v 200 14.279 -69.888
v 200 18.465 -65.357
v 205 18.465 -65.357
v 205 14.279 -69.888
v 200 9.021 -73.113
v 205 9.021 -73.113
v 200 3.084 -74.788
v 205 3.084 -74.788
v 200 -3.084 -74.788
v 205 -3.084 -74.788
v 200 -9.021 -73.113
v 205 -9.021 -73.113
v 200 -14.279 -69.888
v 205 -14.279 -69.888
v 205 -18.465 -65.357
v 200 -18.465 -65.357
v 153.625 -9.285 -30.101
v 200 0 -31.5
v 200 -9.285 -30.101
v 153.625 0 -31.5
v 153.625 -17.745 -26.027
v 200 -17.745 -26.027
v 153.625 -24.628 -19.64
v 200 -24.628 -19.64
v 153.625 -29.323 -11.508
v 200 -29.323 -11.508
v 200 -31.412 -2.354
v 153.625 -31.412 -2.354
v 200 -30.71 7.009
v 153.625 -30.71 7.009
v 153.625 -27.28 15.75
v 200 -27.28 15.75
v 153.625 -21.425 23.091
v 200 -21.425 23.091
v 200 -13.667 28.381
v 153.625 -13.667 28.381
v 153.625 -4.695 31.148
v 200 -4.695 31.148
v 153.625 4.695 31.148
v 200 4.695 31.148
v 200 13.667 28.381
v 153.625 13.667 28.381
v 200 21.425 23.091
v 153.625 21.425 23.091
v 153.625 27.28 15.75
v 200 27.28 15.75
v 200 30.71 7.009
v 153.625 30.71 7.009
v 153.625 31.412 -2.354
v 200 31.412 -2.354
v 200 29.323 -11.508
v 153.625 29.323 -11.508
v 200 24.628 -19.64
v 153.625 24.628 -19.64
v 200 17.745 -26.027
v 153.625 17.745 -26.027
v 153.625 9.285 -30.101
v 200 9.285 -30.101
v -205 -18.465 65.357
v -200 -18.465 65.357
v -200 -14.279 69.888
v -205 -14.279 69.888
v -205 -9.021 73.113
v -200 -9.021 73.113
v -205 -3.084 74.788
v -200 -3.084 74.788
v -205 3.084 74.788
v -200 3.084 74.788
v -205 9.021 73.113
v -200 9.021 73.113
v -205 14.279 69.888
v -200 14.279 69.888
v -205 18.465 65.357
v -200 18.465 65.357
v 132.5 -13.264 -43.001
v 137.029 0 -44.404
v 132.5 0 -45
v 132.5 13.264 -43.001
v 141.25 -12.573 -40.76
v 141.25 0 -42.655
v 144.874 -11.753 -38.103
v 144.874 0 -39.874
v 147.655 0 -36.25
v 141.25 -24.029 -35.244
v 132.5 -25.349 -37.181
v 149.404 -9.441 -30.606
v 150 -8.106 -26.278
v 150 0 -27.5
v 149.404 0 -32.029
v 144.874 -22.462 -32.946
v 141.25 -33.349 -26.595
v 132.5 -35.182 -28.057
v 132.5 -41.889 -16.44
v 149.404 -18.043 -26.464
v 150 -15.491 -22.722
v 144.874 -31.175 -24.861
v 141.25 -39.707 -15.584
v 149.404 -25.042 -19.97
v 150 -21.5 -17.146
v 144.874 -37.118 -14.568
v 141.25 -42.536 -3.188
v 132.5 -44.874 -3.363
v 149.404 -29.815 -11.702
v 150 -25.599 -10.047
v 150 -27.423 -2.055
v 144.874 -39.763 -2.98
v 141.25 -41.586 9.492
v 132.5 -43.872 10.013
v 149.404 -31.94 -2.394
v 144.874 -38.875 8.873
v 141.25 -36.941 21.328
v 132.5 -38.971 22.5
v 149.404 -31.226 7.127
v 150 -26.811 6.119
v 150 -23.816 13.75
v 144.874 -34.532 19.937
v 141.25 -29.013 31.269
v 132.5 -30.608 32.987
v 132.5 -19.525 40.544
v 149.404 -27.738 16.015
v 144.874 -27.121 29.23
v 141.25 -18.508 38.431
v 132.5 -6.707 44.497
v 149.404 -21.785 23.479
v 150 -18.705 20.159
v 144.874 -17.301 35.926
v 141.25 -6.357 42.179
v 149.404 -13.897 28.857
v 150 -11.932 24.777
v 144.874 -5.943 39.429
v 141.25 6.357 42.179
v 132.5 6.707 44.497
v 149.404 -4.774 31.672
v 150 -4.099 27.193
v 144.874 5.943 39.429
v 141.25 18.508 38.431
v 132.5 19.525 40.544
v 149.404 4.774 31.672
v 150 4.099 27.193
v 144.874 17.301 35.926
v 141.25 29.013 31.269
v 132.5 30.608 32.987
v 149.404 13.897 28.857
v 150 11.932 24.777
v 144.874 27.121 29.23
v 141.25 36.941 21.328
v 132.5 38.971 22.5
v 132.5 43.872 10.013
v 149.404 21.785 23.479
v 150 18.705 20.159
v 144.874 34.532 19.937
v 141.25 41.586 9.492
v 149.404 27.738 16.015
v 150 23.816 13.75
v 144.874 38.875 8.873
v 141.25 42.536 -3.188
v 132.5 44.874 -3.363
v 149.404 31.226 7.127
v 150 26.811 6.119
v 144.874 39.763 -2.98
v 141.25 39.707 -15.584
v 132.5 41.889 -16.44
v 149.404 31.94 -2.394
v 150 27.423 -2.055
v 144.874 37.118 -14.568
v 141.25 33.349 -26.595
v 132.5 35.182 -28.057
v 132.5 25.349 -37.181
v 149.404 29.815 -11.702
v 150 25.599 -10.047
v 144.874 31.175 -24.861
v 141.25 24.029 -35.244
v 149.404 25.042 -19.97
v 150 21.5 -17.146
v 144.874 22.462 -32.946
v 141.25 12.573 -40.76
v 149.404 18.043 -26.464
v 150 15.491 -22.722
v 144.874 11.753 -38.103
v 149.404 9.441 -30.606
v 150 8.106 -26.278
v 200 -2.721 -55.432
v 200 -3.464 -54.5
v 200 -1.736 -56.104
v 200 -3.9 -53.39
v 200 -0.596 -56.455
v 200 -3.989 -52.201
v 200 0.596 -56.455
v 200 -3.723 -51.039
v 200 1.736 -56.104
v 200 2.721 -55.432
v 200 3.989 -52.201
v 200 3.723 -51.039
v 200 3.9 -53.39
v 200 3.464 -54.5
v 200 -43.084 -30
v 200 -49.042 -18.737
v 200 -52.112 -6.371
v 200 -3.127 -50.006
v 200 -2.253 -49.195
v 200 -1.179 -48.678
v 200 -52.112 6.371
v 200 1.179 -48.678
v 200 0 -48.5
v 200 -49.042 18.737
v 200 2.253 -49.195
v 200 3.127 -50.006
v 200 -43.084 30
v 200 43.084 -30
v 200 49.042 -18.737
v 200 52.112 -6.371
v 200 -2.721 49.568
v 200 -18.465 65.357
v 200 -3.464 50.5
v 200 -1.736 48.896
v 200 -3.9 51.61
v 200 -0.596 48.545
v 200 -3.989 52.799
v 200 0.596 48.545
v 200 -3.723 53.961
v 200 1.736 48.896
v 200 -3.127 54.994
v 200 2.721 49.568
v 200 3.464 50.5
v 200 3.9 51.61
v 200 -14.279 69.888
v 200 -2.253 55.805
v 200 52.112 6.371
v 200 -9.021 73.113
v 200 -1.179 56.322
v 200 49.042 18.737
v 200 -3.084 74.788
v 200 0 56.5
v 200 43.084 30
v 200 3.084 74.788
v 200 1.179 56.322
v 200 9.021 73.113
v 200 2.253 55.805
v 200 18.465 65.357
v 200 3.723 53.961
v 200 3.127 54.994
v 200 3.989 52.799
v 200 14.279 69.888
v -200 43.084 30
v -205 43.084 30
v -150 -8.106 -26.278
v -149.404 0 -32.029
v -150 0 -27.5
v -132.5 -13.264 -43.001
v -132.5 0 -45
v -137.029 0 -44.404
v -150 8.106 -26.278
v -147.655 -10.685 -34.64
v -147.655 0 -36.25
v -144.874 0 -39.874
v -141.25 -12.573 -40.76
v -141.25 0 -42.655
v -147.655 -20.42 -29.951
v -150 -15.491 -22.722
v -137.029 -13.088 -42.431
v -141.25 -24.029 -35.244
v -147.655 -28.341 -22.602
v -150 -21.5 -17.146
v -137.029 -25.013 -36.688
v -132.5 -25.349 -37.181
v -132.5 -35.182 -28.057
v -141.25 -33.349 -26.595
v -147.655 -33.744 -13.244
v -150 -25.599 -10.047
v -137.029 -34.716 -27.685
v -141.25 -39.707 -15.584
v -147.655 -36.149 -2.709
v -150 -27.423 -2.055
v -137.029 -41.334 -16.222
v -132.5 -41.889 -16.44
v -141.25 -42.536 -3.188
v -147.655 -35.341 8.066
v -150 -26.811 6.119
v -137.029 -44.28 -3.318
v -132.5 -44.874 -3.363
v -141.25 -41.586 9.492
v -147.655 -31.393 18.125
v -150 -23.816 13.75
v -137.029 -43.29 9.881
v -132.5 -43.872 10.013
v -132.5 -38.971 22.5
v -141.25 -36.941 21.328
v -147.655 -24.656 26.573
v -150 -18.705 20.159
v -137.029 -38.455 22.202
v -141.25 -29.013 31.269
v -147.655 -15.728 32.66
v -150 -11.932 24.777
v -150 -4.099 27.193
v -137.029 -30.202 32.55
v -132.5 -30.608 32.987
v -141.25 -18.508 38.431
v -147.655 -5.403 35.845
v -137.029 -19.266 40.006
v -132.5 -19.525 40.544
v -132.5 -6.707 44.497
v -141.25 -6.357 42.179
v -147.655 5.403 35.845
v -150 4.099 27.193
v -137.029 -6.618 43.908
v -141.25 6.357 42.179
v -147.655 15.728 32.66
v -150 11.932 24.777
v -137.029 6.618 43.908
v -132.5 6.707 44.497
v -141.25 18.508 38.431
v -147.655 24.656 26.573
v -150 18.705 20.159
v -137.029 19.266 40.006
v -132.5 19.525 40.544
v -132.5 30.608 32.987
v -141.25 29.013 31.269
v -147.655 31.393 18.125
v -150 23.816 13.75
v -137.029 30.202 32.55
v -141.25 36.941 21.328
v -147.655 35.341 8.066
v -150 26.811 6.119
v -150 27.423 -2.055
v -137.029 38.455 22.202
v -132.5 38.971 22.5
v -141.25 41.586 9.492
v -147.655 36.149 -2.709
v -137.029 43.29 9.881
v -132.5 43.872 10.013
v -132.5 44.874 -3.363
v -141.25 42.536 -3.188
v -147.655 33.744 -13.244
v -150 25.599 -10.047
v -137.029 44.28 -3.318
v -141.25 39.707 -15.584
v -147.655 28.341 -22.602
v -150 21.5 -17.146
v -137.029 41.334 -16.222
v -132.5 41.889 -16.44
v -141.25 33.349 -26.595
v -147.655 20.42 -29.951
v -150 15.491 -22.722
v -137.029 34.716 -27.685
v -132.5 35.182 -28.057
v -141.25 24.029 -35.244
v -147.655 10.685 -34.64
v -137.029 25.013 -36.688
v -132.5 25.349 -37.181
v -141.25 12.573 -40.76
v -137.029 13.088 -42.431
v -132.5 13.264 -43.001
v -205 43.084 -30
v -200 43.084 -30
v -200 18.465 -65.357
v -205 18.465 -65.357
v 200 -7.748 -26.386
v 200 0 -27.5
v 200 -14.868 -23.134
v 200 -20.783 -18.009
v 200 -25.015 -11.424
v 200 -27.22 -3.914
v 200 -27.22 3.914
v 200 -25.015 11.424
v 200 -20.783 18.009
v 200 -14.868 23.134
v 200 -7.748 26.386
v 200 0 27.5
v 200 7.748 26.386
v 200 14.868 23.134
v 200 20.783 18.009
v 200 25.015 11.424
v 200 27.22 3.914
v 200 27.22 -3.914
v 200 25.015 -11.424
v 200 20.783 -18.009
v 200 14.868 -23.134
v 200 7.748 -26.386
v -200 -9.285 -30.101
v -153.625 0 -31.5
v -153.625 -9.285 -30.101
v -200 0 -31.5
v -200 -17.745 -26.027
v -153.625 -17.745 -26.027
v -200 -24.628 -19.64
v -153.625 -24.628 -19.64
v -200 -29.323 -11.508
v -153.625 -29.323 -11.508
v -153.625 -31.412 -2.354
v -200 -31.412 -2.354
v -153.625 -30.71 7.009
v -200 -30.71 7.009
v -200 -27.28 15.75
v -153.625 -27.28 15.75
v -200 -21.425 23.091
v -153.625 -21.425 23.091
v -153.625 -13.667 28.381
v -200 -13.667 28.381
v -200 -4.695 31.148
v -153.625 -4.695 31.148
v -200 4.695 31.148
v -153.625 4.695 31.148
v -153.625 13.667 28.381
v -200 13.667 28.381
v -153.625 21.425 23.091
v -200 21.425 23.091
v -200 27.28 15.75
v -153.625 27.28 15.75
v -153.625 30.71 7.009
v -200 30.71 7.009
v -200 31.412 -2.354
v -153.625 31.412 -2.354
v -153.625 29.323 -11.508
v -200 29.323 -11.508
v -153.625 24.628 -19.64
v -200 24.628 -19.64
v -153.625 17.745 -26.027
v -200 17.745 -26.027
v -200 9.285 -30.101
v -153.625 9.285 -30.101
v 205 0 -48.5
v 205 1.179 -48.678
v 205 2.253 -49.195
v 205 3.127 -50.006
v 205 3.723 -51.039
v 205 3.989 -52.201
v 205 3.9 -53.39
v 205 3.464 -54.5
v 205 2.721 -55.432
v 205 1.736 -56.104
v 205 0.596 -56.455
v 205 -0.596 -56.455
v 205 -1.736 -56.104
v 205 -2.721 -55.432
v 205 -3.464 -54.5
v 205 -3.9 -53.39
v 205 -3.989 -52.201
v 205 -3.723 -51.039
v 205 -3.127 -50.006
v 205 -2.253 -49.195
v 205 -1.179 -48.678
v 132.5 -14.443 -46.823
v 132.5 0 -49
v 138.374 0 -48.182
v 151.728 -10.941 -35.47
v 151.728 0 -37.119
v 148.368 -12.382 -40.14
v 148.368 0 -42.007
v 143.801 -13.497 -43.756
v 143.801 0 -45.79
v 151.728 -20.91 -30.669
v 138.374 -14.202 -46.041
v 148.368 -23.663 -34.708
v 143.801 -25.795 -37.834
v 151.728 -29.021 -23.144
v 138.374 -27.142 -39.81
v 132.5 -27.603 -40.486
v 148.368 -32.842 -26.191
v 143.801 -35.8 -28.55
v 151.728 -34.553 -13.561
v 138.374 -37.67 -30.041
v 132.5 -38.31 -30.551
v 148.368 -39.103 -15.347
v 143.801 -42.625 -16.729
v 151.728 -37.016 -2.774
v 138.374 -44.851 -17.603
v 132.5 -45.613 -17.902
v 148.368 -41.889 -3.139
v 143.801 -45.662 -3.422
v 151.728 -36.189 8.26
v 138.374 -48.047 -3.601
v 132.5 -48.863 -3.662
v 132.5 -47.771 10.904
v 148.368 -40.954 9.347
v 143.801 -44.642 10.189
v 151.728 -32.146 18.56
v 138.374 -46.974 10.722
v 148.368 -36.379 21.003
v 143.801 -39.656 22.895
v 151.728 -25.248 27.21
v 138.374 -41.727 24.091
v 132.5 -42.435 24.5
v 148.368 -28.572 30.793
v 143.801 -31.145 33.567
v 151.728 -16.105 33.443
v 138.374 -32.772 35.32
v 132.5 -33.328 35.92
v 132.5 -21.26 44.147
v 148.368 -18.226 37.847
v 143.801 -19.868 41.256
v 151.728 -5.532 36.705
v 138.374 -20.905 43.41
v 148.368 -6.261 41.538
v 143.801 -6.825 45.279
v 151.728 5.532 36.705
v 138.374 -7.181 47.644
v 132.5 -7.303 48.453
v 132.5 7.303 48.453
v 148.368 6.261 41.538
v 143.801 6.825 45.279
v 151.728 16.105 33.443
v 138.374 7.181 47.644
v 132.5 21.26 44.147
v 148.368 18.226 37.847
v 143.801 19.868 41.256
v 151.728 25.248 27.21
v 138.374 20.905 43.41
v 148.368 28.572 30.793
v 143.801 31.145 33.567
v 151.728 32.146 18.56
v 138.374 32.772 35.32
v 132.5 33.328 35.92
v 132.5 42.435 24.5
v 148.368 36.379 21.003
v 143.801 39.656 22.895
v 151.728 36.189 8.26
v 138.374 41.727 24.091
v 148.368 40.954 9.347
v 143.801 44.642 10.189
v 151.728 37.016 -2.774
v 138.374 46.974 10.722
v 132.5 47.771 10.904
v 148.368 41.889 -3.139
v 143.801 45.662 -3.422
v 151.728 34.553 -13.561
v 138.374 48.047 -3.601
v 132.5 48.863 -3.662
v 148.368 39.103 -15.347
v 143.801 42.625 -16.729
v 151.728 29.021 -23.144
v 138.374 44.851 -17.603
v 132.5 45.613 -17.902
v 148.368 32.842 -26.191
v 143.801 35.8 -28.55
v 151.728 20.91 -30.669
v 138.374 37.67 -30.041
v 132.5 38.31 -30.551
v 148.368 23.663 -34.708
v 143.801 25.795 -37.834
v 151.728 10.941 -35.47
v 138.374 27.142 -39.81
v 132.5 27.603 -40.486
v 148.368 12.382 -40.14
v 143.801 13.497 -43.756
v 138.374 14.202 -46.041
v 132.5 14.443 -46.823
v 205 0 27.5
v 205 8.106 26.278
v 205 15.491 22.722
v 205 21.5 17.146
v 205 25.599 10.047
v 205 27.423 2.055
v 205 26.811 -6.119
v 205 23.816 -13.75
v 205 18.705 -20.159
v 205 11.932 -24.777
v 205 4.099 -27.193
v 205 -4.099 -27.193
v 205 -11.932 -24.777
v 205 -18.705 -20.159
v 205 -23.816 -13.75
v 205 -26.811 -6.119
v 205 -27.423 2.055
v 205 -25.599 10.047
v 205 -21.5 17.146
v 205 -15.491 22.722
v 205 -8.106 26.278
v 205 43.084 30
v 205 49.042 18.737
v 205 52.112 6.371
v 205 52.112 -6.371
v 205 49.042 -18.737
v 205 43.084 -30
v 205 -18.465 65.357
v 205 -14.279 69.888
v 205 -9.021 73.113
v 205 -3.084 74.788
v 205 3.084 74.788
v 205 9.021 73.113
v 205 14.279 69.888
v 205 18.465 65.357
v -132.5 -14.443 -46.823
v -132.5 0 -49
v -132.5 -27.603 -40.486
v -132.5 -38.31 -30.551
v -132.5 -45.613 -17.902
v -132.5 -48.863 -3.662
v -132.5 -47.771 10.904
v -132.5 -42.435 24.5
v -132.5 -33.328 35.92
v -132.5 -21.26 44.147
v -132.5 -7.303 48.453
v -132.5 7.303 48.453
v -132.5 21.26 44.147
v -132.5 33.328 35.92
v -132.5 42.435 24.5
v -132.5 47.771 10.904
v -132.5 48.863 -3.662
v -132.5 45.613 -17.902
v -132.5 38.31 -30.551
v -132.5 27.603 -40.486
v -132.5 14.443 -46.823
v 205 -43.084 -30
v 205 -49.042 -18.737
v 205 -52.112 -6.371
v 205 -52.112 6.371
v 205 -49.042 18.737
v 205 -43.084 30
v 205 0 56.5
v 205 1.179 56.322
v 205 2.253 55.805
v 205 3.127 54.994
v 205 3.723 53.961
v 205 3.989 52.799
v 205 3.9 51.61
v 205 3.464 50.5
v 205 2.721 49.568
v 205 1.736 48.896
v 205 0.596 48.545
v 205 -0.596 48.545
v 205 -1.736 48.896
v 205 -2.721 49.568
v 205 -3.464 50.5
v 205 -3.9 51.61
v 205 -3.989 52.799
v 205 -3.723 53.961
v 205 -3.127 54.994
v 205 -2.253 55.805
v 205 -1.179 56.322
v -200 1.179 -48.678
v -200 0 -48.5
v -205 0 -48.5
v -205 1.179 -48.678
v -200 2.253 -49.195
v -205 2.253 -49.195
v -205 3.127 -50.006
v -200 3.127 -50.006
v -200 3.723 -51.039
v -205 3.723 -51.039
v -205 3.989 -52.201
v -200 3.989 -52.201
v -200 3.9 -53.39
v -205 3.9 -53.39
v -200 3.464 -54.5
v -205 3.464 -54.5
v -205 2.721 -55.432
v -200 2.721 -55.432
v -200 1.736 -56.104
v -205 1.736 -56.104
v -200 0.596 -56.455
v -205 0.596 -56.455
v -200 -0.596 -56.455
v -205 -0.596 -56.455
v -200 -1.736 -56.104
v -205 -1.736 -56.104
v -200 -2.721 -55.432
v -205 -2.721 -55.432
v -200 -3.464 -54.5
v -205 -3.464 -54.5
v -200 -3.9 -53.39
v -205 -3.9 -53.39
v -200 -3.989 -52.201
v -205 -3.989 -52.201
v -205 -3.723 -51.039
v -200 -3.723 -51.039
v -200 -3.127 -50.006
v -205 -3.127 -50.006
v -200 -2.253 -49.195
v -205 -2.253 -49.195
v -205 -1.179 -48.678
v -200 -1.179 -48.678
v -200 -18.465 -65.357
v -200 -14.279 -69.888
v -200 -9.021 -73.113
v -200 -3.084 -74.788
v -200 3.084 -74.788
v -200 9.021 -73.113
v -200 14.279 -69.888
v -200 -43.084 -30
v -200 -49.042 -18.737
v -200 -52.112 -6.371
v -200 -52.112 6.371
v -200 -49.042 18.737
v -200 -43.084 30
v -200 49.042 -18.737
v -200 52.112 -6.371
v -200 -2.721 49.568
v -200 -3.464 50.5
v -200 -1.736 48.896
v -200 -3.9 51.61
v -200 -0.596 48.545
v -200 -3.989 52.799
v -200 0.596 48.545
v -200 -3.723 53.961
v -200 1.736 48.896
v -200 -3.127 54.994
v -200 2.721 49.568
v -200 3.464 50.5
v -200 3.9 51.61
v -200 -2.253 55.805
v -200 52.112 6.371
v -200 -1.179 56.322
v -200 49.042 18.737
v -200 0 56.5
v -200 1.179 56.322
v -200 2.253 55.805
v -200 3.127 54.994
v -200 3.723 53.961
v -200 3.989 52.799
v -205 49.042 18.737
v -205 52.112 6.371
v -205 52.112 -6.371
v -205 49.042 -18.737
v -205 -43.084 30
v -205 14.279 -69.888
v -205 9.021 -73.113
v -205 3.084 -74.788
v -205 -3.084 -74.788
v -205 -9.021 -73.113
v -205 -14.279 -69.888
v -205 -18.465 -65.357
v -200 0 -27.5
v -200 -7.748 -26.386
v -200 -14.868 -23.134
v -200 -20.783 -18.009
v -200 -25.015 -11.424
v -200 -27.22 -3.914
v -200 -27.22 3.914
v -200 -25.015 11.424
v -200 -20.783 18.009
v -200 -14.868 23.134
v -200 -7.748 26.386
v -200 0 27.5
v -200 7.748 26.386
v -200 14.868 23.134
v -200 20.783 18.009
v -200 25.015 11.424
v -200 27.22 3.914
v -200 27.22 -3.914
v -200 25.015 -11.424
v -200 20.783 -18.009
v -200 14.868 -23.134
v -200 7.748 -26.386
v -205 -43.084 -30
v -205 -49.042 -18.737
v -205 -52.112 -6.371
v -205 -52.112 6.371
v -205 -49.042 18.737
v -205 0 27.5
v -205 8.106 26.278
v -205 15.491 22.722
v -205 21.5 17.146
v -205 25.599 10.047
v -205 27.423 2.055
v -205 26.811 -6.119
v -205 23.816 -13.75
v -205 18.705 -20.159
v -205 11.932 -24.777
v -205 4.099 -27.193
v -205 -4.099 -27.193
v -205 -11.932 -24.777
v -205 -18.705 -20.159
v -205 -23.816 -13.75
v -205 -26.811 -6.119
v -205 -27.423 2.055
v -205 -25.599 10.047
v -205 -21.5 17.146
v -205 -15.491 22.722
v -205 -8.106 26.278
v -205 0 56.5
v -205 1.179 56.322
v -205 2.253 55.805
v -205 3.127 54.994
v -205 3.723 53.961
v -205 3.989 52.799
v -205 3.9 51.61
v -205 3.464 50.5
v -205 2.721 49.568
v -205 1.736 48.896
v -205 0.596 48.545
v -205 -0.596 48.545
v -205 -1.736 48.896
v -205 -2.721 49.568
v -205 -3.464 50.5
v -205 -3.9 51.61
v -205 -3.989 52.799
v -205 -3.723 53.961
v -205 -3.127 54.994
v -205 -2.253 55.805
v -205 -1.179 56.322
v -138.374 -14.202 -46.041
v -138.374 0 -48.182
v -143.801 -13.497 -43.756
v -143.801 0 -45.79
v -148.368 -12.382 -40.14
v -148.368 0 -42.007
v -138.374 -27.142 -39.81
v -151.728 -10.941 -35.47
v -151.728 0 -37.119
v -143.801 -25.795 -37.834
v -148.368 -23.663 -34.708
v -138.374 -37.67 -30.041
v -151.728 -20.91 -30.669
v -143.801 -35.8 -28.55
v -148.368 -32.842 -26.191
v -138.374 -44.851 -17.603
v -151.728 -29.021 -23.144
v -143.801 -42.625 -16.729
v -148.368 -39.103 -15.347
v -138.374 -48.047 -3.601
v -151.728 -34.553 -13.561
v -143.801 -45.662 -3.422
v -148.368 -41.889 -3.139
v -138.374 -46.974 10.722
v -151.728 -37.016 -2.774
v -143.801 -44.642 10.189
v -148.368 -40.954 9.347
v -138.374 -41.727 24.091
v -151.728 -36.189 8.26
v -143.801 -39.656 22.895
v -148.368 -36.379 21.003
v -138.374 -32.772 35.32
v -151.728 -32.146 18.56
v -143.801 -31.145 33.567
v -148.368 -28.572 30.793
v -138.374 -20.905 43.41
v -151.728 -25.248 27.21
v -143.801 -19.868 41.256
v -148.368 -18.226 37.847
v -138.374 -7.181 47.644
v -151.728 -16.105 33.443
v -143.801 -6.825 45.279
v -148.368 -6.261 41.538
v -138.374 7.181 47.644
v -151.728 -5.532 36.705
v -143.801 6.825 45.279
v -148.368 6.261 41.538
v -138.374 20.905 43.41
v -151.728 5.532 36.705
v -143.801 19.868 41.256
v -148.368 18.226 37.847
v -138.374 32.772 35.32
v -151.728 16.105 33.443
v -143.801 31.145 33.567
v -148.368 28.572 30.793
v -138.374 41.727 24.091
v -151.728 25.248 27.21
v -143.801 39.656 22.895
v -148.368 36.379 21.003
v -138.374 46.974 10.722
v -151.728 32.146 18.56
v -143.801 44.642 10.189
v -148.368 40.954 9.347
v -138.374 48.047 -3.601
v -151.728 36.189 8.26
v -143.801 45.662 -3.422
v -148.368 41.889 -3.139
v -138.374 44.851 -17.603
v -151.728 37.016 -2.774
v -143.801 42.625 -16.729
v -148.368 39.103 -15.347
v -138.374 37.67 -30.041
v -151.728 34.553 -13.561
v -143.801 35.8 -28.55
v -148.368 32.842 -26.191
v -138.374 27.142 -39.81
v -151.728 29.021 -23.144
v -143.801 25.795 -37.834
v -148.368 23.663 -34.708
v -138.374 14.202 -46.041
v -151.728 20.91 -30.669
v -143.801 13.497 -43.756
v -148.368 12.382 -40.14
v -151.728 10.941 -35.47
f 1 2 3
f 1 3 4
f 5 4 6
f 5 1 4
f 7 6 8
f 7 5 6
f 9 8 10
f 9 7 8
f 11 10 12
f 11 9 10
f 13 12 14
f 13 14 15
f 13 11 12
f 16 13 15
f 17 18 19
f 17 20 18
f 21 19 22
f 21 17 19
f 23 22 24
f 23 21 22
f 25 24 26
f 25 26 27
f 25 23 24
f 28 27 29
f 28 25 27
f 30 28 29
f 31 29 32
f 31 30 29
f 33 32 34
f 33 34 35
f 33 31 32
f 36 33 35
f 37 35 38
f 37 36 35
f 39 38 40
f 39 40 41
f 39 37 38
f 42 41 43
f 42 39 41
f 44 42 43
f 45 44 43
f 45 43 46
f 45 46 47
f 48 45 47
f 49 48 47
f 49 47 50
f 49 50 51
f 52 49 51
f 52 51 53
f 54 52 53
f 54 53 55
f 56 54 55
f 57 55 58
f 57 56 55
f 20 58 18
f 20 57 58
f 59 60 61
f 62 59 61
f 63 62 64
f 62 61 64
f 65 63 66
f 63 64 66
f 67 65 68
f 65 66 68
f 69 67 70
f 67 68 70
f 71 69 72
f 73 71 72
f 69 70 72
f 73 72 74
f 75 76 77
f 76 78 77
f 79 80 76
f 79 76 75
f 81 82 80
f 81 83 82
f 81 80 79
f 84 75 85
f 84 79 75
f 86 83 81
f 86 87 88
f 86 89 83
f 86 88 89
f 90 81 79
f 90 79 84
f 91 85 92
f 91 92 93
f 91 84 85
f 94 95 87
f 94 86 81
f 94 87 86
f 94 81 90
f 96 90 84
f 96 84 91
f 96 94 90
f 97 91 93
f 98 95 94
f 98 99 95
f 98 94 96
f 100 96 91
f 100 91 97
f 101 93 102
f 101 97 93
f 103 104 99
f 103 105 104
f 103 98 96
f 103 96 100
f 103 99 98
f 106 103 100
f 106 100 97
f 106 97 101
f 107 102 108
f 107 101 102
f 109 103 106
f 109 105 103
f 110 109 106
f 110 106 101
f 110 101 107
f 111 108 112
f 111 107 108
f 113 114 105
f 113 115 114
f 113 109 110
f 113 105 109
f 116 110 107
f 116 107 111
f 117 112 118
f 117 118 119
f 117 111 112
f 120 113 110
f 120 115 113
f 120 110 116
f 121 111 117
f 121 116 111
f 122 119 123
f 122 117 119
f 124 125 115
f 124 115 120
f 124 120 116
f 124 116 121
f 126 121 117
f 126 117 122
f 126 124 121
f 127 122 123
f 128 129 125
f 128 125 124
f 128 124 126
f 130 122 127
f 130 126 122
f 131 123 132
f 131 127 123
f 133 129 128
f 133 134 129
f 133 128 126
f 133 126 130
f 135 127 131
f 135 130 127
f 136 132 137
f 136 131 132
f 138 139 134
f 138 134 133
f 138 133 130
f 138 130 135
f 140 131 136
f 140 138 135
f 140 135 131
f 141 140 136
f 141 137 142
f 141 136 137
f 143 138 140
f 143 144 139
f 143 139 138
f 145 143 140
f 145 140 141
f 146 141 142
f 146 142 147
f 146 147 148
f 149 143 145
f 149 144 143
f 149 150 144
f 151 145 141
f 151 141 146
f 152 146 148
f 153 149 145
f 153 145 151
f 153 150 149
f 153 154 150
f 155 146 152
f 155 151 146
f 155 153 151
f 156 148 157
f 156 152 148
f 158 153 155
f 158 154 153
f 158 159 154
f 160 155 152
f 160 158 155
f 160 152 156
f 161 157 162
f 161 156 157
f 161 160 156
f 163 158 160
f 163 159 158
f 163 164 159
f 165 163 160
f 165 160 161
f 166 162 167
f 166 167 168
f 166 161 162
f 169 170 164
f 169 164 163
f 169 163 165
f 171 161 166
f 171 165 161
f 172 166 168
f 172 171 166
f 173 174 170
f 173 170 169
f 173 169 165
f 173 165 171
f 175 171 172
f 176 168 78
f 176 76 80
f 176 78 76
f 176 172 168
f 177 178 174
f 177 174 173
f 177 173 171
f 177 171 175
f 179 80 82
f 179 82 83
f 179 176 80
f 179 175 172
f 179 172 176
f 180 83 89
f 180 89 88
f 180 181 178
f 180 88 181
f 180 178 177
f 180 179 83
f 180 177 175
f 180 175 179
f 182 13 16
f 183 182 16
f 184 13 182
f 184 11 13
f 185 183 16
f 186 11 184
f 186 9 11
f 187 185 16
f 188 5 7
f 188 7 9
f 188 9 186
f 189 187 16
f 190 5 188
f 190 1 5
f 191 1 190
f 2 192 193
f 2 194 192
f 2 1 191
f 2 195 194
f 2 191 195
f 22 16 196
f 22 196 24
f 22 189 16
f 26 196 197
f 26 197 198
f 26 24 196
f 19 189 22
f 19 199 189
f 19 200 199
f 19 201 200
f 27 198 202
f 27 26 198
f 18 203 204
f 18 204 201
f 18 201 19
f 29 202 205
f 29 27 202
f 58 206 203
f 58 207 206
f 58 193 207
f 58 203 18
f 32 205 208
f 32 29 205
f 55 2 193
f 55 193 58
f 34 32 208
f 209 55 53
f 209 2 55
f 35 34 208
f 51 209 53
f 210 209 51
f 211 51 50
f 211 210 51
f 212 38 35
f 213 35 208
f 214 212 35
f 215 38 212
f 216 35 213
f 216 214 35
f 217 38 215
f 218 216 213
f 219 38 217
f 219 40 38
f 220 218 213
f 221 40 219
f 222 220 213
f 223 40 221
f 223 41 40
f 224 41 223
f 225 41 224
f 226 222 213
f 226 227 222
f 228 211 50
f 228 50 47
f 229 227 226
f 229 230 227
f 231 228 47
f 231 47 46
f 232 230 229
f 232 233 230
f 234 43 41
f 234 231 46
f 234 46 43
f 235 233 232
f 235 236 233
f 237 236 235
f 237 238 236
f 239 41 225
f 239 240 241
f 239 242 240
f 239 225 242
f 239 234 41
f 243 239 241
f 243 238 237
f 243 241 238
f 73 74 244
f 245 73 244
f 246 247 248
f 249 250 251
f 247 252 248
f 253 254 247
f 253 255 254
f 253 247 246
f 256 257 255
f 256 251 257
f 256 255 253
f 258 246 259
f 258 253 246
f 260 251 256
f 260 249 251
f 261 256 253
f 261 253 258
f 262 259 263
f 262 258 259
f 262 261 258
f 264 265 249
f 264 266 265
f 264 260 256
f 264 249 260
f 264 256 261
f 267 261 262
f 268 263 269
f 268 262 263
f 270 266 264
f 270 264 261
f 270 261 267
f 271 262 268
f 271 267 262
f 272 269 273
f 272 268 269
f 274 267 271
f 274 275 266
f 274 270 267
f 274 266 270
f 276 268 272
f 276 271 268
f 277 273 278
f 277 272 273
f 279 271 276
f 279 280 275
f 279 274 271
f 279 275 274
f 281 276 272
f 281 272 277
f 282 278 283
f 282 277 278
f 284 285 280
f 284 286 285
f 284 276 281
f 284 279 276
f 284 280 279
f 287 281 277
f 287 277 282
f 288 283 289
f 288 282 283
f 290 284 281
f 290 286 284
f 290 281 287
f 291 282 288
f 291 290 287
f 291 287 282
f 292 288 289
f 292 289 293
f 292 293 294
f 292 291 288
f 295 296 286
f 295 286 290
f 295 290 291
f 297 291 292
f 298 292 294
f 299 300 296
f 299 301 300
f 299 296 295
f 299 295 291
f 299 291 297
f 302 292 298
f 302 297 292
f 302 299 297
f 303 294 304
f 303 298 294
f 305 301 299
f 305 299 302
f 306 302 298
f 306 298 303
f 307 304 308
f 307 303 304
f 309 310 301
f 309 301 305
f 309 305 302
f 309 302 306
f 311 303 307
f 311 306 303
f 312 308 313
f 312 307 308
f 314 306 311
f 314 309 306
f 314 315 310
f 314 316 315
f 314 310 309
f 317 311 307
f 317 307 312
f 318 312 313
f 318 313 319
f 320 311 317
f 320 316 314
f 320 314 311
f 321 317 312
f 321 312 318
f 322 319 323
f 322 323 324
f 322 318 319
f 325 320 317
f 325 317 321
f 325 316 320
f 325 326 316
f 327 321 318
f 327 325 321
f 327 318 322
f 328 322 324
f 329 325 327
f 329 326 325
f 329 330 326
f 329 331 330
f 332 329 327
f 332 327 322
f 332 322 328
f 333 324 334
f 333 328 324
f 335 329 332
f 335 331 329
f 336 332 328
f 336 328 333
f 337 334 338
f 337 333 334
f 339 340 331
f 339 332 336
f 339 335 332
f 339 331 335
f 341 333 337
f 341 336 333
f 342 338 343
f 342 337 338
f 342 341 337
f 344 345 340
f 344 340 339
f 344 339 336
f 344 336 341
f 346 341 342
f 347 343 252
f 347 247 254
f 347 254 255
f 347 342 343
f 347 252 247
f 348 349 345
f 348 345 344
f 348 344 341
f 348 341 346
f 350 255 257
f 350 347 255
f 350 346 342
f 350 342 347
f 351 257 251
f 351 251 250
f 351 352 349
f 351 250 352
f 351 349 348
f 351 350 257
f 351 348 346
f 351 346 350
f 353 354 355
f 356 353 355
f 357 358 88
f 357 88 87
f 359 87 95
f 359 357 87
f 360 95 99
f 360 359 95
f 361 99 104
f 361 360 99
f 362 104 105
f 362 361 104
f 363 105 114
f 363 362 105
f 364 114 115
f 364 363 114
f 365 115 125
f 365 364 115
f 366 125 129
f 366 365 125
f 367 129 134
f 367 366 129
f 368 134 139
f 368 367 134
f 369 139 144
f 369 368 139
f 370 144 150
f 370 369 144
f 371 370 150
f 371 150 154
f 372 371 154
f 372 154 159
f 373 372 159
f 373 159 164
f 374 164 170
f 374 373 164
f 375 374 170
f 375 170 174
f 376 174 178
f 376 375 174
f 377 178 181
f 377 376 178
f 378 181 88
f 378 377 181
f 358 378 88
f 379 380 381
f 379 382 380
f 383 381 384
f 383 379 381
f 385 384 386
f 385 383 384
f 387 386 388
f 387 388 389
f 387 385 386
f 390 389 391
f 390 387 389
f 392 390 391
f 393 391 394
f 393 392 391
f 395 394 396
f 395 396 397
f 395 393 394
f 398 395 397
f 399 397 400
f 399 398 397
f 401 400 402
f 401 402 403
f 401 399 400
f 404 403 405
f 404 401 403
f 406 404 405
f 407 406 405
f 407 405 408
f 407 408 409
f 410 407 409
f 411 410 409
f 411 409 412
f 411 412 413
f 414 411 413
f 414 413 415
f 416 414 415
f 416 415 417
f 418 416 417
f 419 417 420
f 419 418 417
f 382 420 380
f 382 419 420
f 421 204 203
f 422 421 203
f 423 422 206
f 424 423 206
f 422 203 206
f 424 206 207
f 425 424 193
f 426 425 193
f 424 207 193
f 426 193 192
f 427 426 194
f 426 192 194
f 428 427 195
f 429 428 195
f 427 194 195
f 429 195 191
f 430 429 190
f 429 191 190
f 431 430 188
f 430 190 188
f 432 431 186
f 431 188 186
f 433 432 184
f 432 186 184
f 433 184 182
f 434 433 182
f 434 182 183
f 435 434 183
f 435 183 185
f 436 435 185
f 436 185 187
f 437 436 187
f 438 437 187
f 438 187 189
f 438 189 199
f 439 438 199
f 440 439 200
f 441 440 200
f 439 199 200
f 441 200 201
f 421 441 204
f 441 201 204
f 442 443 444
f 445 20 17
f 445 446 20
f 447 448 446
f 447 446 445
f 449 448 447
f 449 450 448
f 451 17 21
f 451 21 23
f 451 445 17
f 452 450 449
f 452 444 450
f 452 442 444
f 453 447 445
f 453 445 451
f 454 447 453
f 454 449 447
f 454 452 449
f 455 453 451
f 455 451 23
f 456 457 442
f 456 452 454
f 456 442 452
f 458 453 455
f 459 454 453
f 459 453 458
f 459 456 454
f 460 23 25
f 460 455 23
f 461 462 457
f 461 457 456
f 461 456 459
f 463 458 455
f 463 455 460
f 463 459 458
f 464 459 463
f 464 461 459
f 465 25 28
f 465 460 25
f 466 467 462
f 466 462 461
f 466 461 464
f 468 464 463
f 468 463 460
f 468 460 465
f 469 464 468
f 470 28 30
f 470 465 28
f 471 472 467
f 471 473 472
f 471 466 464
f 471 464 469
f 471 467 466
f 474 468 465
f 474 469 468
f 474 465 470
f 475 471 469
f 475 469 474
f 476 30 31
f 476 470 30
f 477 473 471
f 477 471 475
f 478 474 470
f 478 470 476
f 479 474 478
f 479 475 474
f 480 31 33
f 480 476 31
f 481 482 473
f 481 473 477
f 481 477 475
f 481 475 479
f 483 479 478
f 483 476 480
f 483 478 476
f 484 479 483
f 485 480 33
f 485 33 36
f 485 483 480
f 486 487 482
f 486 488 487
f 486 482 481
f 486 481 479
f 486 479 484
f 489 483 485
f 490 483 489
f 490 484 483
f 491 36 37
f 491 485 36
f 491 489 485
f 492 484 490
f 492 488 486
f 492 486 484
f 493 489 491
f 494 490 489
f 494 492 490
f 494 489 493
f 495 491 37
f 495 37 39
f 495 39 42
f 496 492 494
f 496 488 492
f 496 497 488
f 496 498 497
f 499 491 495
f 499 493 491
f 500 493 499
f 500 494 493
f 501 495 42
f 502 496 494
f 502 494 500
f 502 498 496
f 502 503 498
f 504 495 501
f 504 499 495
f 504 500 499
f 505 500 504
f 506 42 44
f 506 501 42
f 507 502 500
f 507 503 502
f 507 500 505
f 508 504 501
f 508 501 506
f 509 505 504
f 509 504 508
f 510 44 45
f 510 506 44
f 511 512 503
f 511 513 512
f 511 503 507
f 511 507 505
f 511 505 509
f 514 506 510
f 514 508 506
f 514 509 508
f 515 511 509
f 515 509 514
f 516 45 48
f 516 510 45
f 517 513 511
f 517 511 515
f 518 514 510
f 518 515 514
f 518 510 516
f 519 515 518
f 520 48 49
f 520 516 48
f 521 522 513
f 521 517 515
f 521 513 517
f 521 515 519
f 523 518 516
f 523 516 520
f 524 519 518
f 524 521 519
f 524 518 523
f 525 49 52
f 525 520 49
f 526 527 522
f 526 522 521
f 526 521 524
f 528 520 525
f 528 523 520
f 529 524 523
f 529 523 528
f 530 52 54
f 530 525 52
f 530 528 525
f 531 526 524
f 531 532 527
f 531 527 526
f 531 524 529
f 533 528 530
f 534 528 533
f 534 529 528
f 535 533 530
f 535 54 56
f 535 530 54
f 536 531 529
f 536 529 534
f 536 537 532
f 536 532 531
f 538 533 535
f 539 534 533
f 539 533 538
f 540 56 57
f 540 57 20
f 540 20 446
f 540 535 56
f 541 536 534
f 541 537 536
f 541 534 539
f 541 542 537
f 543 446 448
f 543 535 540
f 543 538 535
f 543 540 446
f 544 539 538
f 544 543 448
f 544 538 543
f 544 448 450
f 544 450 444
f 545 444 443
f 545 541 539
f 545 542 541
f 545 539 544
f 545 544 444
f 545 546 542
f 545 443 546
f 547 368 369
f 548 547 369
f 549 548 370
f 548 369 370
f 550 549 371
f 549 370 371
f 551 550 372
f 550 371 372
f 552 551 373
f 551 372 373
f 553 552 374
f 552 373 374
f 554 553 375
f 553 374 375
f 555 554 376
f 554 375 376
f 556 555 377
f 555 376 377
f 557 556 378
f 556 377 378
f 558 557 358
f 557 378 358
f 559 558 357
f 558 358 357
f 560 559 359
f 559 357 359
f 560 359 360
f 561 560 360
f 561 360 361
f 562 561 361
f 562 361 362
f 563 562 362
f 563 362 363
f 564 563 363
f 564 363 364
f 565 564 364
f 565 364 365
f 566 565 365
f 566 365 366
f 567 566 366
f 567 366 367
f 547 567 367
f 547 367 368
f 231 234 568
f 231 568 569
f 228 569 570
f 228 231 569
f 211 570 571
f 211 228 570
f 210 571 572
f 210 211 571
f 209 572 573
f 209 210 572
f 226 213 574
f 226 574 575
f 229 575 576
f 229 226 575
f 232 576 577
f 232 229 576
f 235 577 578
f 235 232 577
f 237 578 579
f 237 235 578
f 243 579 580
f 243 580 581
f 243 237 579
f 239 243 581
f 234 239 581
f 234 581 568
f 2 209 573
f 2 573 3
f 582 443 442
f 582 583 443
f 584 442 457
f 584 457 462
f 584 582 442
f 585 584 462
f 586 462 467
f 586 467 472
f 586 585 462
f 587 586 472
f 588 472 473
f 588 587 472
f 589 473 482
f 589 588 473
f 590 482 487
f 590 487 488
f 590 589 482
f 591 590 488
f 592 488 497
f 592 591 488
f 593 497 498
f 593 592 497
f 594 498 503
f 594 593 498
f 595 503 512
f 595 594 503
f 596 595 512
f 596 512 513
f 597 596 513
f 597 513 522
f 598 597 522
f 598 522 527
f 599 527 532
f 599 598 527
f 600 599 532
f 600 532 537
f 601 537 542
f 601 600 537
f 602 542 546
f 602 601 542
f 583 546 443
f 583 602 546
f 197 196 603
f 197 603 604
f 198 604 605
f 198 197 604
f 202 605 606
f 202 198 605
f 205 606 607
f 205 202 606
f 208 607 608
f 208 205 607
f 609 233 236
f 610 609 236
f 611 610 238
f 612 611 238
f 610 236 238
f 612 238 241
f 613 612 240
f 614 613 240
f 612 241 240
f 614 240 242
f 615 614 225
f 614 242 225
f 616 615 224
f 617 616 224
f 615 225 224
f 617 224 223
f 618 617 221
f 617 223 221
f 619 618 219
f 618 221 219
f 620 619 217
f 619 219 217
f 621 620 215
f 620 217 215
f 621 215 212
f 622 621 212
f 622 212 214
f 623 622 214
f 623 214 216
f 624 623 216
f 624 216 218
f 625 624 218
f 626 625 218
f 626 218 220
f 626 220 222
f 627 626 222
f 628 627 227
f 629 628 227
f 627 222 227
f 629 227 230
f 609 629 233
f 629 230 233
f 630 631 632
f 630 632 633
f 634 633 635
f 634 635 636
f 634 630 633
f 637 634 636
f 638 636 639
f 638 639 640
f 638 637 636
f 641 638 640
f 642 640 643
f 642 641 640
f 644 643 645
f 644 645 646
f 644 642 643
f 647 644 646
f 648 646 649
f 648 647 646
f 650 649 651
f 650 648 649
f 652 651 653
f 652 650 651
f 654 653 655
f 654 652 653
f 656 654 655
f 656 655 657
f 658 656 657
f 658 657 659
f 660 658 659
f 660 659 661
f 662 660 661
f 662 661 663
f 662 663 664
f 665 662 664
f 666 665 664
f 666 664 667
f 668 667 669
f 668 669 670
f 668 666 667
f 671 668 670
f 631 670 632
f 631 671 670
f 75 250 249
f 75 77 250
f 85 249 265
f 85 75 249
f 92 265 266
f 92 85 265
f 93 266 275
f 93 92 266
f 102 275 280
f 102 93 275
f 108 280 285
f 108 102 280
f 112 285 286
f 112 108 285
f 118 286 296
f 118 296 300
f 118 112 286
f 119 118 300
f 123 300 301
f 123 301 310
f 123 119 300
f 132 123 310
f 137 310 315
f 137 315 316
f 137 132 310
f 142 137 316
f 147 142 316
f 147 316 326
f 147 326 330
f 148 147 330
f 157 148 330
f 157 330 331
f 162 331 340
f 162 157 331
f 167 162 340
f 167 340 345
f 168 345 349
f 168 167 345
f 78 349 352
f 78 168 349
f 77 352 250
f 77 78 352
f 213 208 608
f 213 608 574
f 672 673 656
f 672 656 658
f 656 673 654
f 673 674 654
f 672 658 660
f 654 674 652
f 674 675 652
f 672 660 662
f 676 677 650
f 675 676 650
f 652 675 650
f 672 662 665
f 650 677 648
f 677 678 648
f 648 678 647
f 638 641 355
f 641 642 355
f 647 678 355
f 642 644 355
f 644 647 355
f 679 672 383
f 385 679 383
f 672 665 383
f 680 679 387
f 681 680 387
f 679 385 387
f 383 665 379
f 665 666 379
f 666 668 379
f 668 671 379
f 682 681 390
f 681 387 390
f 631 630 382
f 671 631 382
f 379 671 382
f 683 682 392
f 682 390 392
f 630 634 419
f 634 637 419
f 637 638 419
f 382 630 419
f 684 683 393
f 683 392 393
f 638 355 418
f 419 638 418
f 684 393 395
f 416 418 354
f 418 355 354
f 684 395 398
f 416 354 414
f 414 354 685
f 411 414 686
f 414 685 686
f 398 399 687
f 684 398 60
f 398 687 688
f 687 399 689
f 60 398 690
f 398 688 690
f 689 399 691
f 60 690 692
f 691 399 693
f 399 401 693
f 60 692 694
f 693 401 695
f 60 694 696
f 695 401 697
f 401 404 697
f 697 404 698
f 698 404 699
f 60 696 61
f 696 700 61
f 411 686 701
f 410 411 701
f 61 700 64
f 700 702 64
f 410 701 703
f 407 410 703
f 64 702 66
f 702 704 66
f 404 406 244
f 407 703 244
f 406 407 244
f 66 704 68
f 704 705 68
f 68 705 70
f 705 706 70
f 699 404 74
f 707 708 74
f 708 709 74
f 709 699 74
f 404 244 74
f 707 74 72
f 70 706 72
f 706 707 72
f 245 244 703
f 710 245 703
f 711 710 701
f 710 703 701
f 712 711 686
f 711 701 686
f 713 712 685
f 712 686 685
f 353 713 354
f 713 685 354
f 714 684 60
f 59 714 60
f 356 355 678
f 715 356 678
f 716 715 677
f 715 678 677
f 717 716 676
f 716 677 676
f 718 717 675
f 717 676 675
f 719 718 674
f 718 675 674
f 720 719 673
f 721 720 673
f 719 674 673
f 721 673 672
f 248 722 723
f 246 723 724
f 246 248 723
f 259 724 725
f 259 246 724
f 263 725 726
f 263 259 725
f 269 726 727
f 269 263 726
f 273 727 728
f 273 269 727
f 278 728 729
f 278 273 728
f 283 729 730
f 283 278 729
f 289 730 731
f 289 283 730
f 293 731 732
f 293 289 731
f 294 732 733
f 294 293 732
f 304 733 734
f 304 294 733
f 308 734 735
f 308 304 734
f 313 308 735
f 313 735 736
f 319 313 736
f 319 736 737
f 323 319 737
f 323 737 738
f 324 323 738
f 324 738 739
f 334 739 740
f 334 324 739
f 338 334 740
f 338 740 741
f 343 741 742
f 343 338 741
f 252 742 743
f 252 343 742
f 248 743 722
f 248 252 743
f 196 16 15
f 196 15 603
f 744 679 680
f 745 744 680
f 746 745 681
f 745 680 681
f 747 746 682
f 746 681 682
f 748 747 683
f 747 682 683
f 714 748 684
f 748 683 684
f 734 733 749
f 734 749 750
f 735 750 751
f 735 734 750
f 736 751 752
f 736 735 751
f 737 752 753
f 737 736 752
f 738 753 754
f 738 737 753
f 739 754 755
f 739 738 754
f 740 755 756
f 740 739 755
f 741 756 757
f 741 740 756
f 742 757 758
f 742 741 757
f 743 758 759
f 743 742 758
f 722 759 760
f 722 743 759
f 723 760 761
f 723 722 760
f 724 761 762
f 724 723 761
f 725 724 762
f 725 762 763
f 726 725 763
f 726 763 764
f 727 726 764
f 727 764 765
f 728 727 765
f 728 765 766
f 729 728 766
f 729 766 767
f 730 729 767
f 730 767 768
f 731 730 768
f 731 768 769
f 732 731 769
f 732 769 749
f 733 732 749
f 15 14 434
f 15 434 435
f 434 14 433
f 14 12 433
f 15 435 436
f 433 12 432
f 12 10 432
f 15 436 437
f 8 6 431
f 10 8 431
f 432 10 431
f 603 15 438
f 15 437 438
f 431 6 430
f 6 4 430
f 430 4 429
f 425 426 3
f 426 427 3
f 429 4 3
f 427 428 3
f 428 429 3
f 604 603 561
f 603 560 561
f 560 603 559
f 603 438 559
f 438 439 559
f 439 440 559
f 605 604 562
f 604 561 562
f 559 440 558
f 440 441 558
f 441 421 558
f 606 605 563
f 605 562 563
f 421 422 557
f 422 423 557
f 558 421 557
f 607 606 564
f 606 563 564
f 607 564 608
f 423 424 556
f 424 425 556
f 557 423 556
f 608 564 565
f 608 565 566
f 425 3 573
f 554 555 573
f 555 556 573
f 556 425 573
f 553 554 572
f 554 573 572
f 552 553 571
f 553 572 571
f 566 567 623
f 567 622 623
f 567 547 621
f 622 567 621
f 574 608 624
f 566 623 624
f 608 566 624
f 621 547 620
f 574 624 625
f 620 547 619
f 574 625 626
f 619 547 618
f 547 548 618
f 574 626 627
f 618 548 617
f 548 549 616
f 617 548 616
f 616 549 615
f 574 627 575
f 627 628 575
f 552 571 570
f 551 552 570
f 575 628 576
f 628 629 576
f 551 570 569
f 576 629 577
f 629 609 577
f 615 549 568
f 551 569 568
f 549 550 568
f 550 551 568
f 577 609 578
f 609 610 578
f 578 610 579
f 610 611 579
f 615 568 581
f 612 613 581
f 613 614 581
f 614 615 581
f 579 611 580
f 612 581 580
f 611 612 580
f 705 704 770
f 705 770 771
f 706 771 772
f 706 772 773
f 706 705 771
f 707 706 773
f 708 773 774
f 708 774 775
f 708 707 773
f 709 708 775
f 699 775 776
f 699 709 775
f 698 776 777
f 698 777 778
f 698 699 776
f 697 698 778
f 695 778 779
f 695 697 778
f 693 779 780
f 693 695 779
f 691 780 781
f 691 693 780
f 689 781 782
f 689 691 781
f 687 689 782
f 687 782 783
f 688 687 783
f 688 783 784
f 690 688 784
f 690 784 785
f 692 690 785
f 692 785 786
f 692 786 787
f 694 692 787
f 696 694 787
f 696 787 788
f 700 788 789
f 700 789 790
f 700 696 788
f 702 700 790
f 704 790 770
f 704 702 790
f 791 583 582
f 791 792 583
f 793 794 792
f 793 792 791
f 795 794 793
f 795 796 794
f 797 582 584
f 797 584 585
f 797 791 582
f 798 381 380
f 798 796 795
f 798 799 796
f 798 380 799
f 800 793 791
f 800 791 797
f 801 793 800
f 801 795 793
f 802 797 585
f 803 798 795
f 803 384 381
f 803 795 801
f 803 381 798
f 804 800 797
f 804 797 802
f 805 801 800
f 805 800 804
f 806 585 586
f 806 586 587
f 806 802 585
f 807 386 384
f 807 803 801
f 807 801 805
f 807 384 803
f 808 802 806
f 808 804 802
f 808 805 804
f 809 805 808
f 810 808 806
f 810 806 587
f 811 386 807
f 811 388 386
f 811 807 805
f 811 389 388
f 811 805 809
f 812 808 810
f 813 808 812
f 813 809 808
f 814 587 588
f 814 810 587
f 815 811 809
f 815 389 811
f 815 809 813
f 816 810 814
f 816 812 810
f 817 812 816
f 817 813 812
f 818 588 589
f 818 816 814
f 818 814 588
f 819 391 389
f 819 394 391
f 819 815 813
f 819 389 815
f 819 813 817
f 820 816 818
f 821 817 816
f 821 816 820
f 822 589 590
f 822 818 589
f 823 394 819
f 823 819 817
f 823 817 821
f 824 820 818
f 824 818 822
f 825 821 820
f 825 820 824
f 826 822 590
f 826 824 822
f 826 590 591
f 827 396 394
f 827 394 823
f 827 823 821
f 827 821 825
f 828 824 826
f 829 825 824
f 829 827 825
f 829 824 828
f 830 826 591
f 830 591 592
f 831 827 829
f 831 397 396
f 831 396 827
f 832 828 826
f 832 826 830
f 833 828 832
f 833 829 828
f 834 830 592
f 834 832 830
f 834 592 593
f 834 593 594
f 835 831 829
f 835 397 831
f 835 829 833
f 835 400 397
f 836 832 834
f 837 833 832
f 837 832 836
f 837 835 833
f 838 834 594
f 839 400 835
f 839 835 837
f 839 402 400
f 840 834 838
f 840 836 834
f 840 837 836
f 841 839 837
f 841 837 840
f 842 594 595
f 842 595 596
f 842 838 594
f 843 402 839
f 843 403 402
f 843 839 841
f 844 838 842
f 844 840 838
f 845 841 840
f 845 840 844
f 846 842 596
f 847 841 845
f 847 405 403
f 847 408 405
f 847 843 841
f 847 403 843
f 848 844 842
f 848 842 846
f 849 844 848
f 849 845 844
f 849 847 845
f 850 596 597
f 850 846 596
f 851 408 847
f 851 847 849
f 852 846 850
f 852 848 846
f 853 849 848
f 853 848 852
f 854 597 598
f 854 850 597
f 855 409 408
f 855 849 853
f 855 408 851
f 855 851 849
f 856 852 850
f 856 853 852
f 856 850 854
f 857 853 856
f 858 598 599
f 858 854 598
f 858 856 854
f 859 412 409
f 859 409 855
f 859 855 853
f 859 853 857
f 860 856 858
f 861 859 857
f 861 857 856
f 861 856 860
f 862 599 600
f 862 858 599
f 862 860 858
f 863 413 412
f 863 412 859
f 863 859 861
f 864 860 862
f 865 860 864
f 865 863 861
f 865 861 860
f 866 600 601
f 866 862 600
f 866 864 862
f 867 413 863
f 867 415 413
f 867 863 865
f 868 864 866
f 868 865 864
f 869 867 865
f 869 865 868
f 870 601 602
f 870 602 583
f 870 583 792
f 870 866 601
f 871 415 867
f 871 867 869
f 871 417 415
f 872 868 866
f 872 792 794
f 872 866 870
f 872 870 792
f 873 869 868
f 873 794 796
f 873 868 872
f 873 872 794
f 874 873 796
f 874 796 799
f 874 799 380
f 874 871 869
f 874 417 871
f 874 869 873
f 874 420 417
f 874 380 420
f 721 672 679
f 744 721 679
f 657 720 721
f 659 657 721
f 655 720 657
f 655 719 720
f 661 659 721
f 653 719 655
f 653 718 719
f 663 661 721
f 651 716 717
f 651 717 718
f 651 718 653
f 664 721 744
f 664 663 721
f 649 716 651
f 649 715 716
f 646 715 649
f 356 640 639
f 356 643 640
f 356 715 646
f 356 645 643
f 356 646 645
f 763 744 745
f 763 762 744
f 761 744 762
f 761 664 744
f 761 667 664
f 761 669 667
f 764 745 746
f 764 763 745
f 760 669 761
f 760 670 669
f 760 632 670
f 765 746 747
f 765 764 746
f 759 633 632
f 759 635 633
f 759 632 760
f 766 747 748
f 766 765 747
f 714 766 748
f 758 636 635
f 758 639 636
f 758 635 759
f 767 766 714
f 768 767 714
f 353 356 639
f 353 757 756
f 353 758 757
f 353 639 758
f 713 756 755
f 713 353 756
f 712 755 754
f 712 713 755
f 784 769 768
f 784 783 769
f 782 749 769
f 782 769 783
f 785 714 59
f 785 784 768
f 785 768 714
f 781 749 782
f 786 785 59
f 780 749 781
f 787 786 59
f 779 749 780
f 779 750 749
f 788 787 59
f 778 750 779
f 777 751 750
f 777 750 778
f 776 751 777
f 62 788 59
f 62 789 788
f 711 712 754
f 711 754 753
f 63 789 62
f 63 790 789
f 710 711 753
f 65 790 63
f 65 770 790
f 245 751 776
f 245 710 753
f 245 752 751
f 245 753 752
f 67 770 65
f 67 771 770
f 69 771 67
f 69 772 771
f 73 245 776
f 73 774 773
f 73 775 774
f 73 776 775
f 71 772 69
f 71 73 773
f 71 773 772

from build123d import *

# Parameters (mm, degrees)
SKETCH2_R           = 27.5
SKETCH2_R_2         = 4
BOSS_EXTRUDE1_DEPTH = 5


with BuildPart() as part:
    # Sketch1 → Revolve1 (revolve)
    with BuildSketch(Plane(origin=(0, 0, 0), x_dir=(1, 0, 0), z_dir=(0, 1, 0))):
        with BuildLine():
            Line((-200, 27.5), (-150, 27.5))
            ThreePointArc((-150, 27.5), (-144.874368671, 39.874368671), (-132.5, 45))
            Line((-132.5, 45), (132.5, 45))
            ThreePointArc((132.5, 45), (144.874368671, 39.874368671), (150, 27.5))
            Line((150, 27.5), (200, 27.5))
            Line((200, 27.5), (200, 31.5))
            Line((200, 31.5), (153.624630174, 31.5))
            ThreePointArc((153.624630174, 31.5), (146.215866724, 44.05672069), (132.5, 49))
            Line((132.5, 49), (-132.5, 49))
            ThreePointArc((-132.5, 49), (-146.215866724, 44.05672069), (-153.624630174, 31.5))
            Line((-153.624630174, 31.5), (-200, 31.5))
            Line((-200, 31.5), (-200, 27.5))
        make_face()
    revolve(axis=Axis((0, 0, 0), (-1, 0, 0)))

    # Sketch2 → Boss-Extrude1 (add)
    with BuildSketch(Plane.ZY.offset(200)):
        with BuildLine():
            Line((-30, 43.084219849), (-65.357142857, 18.46466565))
            ThreePointArc((-65.357142857, 18.46466565), (-75, 0), (-65.357142857, -18.46466565))
            Line((-65.357142857, -18.46466565), (-30, -43.084219849))
            ThreePointArc((-30, -43.084219849), (0, -52.5), (30, -43.084219849))
            Line((30, -43.084219849), (65.357142857, -18.46466565))
            ThreePointArc((65.357142857, -18.46466565), (75, 0), (65.357142857, 18.46466565))
            Line((65.357142857, 18.46466565), (30, 43.084219849))
            ThreePointArc((30, 43.084219849), (0, 52.5), (-30, 43.084219849))
        make_face()
        Circle(SKETCH2_R, mode=Mode.SUBTRACT)
        with Locations((-52.5, 0)):
            Circle(SKETCH2_R_2, mode=Mode.SUBTRACT)
        with Locations((52.5, 0)):
            Circle(SKETCH2_R_2, mode=Mode.SUBTRACT)
    boss_extrude1 = extrude(amount=BOSS_EXTRUDE1_DEPTH)

    # Mirror1: Boss-Extrude1 across plane
    add(boss_extrude1.mirror(Plane(origin=(0, 0, 0), x_dir=(0, 0, 1), z_dir=(1, 0, 0))))


solid = part.part
